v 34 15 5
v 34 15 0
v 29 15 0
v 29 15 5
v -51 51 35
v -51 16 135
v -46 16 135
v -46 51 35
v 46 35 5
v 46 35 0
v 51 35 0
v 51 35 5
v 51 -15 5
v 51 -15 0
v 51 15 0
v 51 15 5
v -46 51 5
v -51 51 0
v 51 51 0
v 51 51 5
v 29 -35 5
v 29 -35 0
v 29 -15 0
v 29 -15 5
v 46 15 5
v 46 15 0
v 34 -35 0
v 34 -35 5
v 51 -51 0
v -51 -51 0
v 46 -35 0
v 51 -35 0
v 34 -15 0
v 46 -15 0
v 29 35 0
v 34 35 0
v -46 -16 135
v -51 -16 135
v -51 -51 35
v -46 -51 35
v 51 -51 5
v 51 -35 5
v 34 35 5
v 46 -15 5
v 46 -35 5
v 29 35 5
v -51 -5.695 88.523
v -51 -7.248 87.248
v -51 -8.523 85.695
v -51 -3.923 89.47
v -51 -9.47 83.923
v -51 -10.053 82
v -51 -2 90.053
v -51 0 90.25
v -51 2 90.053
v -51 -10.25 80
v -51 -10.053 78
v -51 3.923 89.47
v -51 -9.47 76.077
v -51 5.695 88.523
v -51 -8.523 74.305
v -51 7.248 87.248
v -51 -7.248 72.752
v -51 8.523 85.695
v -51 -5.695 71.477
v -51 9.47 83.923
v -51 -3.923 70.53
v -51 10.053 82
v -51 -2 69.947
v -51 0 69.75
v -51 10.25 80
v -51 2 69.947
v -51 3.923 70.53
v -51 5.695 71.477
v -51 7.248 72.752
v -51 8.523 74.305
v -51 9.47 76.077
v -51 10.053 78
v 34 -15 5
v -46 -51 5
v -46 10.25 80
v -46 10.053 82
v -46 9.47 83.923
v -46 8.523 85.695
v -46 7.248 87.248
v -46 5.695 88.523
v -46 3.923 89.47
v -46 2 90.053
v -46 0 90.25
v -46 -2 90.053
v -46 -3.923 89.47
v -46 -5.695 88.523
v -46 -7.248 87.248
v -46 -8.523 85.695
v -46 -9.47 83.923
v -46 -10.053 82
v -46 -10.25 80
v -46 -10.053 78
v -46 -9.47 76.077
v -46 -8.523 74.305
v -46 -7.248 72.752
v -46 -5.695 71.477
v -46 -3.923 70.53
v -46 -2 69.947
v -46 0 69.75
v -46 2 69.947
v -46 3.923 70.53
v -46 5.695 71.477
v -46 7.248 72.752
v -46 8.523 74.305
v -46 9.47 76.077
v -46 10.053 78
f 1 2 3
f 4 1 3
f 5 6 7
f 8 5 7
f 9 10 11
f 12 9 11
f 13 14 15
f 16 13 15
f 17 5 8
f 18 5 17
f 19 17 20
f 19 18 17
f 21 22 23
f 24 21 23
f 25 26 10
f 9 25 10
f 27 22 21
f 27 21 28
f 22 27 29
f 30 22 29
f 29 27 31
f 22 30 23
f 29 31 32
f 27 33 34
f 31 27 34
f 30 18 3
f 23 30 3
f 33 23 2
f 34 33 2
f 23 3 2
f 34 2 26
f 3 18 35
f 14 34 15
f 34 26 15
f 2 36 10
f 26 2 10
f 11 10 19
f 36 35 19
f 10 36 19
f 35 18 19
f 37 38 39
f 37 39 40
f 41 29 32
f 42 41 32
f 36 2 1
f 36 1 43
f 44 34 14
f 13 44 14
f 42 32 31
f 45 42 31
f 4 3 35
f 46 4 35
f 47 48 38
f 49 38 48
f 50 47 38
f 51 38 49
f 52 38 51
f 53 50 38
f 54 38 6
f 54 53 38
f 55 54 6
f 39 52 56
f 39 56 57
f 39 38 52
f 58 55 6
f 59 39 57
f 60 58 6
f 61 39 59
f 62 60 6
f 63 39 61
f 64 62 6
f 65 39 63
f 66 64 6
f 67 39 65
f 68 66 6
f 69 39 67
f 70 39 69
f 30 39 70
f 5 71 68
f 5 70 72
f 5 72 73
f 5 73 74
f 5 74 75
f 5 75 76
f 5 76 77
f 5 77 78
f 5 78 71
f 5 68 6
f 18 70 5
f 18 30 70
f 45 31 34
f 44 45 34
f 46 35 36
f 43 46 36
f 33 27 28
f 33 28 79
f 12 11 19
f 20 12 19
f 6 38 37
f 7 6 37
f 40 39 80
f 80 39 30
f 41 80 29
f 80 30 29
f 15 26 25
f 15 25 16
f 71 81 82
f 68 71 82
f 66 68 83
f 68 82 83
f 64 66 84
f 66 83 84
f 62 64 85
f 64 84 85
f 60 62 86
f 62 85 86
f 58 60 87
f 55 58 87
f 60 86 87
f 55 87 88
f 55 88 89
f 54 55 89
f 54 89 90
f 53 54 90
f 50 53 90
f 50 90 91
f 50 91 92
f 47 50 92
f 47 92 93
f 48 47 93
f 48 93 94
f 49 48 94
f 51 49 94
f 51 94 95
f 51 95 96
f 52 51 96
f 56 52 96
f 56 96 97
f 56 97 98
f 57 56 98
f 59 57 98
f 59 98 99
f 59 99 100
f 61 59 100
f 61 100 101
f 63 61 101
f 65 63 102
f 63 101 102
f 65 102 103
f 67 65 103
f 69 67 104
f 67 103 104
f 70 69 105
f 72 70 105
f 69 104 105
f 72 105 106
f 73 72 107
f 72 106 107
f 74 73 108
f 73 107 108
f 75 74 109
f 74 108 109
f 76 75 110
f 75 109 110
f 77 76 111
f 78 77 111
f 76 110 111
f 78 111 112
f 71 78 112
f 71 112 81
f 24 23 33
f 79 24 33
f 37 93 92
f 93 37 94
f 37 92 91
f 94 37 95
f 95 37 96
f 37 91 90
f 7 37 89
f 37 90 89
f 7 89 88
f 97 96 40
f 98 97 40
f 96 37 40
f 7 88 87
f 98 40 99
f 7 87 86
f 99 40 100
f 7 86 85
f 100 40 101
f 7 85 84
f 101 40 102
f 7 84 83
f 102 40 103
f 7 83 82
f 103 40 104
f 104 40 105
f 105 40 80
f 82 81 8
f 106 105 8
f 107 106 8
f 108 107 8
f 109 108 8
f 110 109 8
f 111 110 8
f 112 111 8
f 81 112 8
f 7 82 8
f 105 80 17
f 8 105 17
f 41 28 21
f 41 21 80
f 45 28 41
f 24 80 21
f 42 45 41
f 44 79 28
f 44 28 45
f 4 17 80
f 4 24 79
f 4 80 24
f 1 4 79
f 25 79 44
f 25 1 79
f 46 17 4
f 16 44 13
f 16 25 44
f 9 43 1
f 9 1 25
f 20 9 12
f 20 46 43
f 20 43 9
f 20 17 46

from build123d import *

# Parameters (mm, degrees)
F0_W       = 5
F0_H       = 16
F0_W_2     = 12
F0_H_2     = 30
F0_H_3     = 20
F1_DEPTH   = 5
F0_H_4     = 102
F2_DEPTH   = 135
F3_SIZE2   = 35
F3_SIZE    = 100
F3_2_SIZE2 = 35
F3_2_SIZE  = 100
F5_D       = 20.5


with BuildPart() as f1:
    # F0 (on Top) → F1 (new body)
    with BuildSketch(Plane.XY):
        Polygon((29, 35), (29, 51), (-46, 51), (-46, -51), (29, -51), (29, -35), (29, -15), (29, 15), align=None)
        with Locations((31.5, 43)):
            Rectangle(F0_W, F0_H)
        with Locations((40, 43)):
            Rectangle(F0_W_2, F0_H)
        with Locations((31.5, 0)):
            Rectangle(F0_W, F0_H_2)
        with Locations((40, 0)):
            Rectangle(F0_W_2, F0_H_2)
        with Locations((31.5, -43)):
            Rectangle(F0_W, F0_H)
        with Locations((40, -25)):
            Rectangle(F0_W_2, F0_H_3)
        with Locations((40, 25)):
            Rectangle(F0_W_2, F0_H_3)
        Polygon((51, -51), (51, -35), (46, -35), (34, -35), (34, -51), align=None)
        with Locations((48.5, 43)):
            Rectangle(F0_W, F0_H)
        with Locations((48.5, 0)):
            Rectangle(F0_W, F0_H_2)
    extrude(amount=F1_DEPTH)

    # F0 (on Top) → F2 (join)
    with BuildSketch(Plane.XY):
        with Locations((-48.5, 0)):
            Rectangle(F0_W, F0_H_4)
    extrude(amount=F2_DEPTH)

    # F3
    f3_edges = [f1.edges().sort_by_distance(p)[0] for p in [
        (-48.5, -51, 135),
    ]]
    f3_side = f1.faces().sort_by_distance((49.307989, -51, 2.5))[0]
    chamfer(f3_edges, length=F3_SIZE, length2=F3_SIZE2, reference=f3_side)

    # F3#2
    f3_2_edges = [f1.edges().sort_by_distance(p)[0] for p in [
        (-48.5, 51, 135),
    ]]
    f3_2_side = f1.faces().sort_by_distance((49.307989, 51, 2.5))[0]
    chamfer(f3_2_edges, length=F3_2_SIZE, length2=F3_2_SIZE2, reference=f3_2_side)

    # F5 (through all)
    with Locations(Plane(origin=(-51, 0, 0), x_dir=(0, -1, 0), z_dir=(-1, 0, 0))):
        with Locations((0, 80)):
            Hole(F5_D / 2)


solid = f1.part
